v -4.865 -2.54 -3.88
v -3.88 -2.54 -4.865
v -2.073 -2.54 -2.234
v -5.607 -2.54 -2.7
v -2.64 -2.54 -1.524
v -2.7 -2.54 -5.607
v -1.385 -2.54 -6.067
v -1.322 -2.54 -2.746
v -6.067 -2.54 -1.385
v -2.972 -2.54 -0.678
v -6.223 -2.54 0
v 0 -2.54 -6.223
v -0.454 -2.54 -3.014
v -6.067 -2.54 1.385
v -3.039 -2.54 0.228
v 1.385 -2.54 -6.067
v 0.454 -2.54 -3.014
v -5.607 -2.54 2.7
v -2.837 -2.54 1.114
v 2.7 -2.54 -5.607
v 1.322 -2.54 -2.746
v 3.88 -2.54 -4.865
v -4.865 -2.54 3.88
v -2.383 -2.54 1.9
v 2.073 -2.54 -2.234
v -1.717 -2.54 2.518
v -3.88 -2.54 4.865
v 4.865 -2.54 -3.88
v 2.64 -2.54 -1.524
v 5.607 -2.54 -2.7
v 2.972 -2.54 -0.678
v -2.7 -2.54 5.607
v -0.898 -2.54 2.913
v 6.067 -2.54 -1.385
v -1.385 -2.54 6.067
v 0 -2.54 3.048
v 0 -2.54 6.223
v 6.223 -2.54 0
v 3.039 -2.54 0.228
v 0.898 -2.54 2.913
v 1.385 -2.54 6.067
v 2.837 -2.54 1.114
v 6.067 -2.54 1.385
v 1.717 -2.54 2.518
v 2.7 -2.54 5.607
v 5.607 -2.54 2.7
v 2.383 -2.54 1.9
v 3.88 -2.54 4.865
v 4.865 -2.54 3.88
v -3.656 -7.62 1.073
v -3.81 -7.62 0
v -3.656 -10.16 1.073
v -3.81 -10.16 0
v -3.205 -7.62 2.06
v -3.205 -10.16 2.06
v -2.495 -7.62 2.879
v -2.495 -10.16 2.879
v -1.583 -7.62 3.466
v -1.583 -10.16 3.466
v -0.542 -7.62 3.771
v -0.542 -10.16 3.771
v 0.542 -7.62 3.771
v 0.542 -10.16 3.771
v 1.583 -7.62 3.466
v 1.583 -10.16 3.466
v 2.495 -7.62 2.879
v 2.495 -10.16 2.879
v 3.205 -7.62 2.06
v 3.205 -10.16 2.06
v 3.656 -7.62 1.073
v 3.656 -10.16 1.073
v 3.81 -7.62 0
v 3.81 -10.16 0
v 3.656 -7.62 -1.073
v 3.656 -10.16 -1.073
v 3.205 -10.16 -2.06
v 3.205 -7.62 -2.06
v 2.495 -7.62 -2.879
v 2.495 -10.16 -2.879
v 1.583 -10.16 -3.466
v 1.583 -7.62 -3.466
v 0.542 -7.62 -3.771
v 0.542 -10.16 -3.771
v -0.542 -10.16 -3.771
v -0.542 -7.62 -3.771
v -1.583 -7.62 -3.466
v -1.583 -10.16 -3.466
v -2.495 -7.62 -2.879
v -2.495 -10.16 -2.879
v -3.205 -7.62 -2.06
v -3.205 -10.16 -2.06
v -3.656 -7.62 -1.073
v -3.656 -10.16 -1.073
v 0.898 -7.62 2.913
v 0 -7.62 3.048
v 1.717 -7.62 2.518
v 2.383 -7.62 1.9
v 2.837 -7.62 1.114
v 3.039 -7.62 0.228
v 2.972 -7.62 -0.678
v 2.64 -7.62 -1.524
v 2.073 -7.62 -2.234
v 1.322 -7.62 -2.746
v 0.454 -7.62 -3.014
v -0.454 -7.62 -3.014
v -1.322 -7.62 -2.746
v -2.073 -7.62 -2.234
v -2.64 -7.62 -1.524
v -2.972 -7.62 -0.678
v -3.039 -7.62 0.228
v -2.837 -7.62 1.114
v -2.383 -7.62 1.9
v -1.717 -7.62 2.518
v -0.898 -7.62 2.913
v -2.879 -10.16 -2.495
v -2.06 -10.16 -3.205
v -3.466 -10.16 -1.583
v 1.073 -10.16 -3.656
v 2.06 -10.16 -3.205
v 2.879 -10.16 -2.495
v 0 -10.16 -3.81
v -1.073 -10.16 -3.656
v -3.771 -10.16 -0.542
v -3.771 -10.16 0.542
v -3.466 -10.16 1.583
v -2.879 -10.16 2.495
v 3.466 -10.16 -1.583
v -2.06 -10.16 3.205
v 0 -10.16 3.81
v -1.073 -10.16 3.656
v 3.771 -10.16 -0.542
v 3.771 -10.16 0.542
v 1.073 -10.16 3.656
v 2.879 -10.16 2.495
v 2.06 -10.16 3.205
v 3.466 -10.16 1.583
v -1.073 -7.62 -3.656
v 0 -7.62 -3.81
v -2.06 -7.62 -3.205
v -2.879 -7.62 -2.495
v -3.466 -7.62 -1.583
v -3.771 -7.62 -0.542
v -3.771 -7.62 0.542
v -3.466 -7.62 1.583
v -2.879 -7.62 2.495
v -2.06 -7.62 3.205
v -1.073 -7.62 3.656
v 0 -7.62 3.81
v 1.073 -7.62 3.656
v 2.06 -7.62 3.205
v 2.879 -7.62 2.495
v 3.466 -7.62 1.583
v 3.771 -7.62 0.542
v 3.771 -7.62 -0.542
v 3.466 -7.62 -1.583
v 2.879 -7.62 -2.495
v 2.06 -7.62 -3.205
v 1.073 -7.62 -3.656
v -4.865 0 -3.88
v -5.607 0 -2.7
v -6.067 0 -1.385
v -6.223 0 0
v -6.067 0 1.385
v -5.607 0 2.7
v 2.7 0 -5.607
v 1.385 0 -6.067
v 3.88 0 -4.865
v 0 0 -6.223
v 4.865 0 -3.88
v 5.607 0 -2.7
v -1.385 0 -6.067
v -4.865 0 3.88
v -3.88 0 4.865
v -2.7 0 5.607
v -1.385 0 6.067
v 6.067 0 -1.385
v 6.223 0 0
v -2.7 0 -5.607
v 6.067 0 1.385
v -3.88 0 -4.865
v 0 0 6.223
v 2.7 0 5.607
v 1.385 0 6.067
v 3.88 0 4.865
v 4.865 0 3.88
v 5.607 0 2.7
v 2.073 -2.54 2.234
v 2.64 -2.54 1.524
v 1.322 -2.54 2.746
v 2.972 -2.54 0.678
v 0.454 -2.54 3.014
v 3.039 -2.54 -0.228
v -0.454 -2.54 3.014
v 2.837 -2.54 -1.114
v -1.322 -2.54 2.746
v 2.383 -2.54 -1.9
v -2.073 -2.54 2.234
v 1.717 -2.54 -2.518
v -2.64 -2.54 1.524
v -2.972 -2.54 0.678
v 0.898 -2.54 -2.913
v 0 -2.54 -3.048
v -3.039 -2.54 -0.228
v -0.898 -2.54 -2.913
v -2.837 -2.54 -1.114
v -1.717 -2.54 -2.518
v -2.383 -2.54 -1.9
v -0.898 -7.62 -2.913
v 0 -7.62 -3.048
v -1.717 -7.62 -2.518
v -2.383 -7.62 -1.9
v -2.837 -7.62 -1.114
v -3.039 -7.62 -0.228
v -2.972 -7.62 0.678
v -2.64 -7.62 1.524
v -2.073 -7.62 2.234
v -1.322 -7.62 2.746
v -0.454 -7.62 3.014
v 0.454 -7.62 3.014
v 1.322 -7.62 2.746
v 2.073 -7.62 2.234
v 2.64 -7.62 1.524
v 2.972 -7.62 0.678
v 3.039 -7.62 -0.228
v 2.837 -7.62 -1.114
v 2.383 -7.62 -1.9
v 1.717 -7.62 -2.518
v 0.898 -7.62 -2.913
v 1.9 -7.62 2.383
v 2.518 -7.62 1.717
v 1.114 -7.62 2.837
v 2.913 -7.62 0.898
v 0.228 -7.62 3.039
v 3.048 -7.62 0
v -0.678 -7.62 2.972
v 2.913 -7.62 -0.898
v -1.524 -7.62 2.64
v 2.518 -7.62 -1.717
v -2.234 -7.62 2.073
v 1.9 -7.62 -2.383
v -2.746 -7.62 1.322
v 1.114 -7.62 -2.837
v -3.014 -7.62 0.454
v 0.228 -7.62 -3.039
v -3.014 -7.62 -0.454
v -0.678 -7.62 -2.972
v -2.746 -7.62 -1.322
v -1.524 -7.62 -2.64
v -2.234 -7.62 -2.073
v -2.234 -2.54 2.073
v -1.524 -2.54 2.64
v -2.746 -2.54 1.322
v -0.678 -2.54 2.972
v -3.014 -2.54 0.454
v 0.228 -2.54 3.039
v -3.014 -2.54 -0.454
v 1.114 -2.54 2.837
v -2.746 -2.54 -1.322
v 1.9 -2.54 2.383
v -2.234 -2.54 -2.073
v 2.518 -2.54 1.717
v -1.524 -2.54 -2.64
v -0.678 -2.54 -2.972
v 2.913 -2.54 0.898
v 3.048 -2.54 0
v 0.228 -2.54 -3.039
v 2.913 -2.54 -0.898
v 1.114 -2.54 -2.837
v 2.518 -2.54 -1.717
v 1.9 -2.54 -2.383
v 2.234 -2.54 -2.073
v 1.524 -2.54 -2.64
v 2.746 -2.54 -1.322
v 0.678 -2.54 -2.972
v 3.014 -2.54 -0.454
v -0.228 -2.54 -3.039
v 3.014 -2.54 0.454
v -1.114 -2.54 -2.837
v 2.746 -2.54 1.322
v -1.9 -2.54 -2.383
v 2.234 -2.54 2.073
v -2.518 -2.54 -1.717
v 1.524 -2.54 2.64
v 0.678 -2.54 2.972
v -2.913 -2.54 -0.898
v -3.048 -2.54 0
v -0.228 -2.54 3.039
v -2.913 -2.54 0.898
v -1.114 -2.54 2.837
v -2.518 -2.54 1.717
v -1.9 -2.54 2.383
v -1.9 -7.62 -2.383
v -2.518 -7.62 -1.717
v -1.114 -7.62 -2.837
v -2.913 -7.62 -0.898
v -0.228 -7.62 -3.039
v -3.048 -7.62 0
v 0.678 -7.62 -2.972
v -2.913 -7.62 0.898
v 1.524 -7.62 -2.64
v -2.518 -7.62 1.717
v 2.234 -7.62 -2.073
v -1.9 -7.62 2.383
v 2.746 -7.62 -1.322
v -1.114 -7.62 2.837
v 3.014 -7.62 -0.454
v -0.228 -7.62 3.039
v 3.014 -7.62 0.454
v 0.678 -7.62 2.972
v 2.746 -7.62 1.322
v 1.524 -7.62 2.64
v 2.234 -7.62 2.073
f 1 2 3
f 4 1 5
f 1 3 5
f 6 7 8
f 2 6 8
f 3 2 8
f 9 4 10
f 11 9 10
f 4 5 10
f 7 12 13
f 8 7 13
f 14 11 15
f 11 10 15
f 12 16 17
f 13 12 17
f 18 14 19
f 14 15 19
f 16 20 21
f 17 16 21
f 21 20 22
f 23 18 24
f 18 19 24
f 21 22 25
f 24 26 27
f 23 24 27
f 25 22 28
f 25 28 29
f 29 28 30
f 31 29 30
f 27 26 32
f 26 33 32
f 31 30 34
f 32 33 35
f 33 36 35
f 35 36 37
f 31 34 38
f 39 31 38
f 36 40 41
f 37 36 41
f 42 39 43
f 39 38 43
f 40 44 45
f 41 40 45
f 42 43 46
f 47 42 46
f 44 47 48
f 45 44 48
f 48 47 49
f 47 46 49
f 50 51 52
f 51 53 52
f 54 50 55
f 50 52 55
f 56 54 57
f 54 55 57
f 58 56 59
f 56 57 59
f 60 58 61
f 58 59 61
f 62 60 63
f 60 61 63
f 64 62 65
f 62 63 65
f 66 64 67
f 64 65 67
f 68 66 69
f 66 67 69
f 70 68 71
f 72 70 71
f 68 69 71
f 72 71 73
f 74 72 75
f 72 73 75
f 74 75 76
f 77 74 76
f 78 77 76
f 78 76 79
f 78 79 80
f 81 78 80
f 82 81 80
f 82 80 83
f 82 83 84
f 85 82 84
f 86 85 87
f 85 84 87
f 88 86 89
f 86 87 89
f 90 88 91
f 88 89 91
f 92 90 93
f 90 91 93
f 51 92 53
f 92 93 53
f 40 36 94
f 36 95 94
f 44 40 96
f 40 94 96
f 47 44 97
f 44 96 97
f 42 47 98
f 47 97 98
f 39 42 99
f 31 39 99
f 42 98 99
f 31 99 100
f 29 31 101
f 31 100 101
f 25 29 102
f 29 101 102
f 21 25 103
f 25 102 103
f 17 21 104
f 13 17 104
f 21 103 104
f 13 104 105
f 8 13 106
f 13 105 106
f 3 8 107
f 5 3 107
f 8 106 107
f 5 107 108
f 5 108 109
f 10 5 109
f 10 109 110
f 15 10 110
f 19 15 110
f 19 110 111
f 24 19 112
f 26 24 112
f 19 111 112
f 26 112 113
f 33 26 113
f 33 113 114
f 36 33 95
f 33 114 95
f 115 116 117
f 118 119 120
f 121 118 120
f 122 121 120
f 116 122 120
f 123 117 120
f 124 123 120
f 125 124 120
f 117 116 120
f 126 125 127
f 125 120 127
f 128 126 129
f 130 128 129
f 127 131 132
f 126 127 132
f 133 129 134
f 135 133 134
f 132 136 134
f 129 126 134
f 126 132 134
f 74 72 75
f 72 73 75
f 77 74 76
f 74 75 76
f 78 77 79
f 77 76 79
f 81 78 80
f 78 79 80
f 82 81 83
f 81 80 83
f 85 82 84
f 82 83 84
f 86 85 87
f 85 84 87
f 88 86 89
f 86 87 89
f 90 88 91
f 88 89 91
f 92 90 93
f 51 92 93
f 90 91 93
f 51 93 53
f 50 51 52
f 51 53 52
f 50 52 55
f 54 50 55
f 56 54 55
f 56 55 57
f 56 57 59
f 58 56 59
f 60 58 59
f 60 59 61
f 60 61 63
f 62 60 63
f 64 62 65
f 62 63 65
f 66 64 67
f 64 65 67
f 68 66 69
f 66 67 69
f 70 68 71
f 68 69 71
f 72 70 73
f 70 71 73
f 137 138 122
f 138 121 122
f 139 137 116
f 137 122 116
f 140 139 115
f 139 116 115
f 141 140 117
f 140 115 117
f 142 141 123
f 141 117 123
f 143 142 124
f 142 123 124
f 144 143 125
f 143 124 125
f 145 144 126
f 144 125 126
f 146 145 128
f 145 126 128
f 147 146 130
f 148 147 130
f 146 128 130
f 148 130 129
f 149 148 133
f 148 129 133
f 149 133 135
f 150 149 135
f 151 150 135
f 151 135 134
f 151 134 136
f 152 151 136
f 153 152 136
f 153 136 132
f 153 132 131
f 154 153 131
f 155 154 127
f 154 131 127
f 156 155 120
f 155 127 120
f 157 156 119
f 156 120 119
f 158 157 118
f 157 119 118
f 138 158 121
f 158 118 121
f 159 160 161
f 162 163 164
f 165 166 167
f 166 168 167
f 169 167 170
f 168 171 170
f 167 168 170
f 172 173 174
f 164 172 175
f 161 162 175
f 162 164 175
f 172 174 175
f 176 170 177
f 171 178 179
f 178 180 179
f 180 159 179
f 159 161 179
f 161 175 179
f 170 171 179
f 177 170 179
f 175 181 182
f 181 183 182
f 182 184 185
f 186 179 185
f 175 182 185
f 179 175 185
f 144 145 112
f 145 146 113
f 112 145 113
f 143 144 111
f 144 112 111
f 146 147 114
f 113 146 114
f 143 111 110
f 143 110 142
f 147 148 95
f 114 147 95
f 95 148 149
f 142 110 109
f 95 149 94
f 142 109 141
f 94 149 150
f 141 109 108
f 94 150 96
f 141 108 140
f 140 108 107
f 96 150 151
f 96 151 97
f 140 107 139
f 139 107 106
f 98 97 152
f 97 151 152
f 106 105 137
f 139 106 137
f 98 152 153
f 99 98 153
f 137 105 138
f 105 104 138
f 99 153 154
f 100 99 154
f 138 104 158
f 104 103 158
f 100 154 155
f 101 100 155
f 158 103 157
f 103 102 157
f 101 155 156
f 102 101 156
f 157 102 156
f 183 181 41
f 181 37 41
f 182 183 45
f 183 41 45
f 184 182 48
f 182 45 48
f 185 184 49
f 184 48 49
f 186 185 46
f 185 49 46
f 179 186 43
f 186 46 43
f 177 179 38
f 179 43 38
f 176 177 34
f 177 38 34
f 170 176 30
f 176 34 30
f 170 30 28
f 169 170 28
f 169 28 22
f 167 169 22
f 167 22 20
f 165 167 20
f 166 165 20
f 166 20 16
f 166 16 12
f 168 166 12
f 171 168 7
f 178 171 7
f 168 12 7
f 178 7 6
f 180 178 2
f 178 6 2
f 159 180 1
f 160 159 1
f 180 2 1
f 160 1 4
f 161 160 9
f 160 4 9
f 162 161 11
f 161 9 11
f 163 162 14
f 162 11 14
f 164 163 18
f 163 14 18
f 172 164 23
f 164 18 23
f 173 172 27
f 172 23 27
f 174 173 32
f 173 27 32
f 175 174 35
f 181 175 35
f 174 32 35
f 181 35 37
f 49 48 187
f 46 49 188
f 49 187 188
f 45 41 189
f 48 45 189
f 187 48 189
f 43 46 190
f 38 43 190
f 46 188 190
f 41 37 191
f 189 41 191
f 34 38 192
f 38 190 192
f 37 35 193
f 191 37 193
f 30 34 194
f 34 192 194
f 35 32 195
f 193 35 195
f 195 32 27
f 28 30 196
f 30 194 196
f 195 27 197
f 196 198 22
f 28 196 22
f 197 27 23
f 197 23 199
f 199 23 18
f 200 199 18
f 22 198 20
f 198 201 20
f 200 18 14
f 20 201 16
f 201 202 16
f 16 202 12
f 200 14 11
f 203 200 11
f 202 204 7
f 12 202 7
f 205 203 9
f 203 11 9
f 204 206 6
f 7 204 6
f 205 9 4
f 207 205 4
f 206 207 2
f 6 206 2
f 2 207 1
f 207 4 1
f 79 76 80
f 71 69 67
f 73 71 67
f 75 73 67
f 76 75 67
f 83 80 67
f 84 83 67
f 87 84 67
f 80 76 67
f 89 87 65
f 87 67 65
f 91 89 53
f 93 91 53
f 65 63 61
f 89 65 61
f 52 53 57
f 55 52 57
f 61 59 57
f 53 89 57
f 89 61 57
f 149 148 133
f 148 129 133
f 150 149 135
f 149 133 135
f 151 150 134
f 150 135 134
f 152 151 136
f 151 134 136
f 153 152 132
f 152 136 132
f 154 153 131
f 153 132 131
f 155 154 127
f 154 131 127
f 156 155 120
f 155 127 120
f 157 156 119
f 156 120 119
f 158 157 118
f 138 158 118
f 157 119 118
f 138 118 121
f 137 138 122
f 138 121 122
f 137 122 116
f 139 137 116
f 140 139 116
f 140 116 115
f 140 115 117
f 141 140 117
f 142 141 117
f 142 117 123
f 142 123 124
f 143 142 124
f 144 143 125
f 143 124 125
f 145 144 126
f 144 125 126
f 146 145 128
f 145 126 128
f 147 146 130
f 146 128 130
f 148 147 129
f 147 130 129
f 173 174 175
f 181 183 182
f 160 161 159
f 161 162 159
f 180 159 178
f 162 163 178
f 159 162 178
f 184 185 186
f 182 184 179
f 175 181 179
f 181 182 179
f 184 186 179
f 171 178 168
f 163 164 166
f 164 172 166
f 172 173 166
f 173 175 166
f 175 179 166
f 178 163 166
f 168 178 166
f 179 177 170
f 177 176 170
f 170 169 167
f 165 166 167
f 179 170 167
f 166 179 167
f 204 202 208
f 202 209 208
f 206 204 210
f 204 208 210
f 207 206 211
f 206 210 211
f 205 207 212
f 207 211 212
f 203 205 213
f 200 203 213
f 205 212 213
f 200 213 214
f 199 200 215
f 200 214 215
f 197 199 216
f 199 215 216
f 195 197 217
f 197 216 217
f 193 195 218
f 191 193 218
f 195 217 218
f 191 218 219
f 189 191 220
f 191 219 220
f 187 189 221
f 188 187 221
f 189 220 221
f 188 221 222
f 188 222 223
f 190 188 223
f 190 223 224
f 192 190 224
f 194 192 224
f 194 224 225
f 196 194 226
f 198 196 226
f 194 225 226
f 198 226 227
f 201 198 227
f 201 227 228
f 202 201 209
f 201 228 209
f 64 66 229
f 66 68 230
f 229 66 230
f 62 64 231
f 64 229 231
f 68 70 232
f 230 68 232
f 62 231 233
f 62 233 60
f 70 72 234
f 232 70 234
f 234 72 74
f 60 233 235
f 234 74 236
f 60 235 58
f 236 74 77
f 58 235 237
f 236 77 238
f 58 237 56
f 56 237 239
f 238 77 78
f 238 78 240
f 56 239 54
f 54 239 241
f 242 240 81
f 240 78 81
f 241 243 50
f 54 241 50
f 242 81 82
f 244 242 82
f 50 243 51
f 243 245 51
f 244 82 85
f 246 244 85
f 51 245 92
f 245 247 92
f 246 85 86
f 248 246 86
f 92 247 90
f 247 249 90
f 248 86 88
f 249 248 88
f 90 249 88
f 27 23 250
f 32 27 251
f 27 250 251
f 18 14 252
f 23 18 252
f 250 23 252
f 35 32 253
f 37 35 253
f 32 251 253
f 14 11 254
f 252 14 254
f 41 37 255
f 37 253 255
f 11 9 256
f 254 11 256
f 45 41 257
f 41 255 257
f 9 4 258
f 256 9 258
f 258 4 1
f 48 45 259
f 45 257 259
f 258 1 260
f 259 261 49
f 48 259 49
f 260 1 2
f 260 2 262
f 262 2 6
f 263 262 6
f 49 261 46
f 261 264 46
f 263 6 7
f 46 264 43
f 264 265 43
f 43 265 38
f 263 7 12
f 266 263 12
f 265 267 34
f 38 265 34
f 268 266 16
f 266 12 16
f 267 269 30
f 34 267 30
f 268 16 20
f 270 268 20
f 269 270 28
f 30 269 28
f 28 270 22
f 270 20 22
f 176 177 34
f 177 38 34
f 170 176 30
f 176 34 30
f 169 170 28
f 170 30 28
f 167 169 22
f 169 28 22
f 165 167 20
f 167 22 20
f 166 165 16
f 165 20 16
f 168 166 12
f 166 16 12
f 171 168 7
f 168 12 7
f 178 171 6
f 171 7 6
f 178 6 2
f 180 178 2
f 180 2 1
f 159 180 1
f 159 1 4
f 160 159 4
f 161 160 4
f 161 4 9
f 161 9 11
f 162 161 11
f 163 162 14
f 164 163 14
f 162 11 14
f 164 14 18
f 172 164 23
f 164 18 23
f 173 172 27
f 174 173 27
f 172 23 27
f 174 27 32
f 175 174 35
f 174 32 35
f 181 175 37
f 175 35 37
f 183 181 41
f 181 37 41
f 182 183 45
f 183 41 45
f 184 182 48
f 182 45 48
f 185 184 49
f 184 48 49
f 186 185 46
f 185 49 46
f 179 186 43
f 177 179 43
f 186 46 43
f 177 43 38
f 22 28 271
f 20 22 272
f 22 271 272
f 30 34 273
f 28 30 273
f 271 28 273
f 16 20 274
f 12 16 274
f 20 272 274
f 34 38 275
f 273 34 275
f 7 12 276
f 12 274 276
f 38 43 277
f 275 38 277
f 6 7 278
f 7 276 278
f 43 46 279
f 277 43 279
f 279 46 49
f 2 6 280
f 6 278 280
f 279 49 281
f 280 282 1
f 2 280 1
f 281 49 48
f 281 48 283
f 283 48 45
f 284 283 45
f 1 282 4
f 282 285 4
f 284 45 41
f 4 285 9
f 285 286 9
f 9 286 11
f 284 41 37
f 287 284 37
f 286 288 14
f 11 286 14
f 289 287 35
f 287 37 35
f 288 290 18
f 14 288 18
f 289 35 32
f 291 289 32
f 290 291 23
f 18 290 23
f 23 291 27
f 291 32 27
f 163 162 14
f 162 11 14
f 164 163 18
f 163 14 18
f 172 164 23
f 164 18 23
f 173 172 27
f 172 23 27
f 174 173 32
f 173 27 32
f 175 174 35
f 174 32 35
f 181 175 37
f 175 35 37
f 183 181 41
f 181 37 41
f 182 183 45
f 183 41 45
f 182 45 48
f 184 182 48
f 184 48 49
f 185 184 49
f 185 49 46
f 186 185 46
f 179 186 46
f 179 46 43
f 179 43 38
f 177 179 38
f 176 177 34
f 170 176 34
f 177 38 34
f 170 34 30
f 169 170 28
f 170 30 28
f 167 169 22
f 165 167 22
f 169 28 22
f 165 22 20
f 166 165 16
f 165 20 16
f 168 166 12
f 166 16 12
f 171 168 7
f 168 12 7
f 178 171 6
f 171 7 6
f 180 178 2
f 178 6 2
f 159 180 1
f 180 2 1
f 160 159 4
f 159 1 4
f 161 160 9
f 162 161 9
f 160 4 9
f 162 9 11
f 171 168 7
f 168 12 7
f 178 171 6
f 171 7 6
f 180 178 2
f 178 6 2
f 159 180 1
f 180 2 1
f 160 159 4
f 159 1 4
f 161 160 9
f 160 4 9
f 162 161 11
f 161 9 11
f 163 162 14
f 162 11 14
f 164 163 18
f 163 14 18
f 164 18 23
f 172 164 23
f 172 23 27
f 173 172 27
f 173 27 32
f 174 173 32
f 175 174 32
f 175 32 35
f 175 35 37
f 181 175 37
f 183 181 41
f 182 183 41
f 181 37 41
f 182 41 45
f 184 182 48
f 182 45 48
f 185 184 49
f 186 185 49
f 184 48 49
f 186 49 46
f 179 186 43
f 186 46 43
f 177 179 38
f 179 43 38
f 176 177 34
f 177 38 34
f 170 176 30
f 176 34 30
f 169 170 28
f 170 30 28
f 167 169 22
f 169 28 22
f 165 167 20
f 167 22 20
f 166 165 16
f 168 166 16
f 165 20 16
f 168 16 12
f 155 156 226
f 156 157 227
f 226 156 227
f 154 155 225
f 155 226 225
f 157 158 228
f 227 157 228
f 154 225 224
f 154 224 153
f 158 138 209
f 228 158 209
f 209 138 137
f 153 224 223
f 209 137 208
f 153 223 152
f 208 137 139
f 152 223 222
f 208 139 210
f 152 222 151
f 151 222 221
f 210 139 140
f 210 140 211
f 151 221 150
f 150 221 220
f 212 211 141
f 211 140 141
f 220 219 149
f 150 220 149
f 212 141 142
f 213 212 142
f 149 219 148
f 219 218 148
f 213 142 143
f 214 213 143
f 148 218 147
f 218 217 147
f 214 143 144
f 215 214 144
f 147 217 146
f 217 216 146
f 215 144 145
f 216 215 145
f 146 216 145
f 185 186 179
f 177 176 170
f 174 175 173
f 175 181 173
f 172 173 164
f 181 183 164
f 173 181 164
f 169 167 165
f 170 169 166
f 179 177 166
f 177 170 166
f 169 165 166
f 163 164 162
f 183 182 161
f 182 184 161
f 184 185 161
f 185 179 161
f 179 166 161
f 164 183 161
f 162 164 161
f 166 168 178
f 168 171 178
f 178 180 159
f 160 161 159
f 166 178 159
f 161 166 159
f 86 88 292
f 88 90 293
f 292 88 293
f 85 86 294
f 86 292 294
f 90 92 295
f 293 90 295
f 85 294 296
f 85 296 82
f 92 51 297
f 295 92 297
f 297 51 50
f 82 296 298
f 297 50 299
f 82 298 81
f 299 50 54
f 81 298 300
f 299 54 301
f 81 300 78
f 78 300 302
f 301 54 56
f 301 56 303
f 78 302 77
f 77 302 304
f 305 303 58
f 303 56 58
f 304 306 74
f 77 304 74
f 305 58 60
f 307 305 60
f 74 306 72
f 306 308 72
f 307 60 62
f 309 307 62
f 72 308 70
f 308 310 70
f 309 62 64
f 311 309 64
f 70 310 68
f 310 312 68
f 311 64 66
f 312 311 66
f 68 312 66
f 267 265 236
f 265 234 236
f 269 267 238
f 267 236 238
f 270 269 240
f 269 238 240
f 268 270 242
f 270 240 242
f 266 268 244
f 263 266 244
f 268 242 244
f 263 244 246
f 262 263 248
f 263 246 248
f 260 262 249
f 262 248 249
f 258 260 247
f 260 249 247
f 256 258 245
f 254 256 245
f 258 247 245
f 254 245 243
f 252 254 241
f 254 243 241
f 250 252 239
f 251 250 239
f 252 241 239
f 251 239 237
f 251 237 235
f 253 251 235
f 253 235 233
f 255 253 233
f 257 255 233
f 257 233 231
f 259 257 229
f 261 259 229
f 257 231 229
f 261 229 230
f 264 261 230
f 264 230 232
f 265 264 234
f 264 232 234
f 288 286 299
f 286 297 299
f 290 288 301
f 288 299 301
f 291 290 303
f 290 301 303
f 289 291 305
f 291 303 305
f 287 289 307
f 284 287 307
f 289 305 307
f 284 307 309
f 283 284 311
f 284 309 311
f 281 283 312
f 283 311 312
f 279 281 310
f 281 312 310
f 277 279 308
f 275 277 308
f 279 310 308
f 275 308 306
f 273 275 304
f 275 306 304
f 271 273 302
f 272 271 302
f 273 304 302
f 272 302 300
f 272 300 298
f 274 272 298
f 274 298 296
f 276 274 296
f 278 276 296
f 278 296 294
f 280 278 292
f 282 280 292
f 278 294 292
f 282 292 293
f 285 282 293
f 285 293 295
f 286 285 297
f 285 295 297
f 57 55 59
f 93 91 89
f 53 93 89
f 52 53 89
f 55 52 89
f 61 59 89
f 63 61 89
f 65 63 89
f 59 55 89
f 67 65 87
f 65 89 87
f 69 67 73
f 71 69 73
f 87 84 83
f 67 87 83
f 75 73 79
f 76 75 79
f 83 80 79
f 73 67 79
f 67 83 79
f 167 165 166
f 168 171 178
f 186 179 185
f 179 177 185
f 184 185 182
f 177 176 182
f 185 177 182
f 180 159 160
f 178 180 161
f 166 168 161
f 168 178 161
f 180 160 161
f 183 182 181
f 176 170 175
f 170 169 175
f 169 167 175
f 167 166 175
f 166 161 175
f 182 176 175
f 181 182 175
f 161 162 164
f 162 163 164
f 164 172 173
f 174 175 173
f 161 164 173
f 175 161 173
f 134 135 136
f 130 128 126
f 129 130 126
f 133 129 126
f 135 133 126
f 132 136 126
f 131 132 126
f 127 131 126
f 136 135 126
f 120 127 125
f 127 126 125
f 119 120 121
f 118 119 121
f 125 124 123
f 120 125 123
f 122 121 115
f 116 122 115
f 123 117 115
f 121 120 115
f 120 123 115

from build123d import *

# Parameters (mm, degrees)
MOAR_SPRINGS_COUNT = 4


with BuildPart() as part:
    # Sketch1 → button body (revolve)
    with BuildSketch(Plane.XY):
        Polygon((0, 0), (6.223, 0), (6.223, -2.54), (3.048, -2.54), (3.048, -7.62), (3.81, -7.62), (3.81, -10.16), (0, -10.16), align=None)
    revolve(axis=Axis((0, -10.16, 0), (0, 1, 0)))


with BuildPart() as moar_springs_1:
    # moar springs: pattern copy
    add(part.part.rotate(Axis((0, 0, 0), (0, -1, 0)), 1 * 360 / MOAR_SPRINGS_COUNT))


with BuildPart() as moar_springs_2:
    # moar springs: pattern copy
    add(part.part.rotate(Axis((0, 0, 0), (0, -1, 0)), 2 * 360 / MOAR_SPRINGS_COUNT))


with BuildPart() as moar_springs_3:
    # moar springs: pattern copy
    add(part.part.rotate(Axis((0, 0, 0), (0, -1, 0)), 3 * 360 / MOAR_SPRINGS_COUNT))


solid = Compound([part.part, moar_springs_1.part, moar_springs_2.part, moar_springs_3.part])
